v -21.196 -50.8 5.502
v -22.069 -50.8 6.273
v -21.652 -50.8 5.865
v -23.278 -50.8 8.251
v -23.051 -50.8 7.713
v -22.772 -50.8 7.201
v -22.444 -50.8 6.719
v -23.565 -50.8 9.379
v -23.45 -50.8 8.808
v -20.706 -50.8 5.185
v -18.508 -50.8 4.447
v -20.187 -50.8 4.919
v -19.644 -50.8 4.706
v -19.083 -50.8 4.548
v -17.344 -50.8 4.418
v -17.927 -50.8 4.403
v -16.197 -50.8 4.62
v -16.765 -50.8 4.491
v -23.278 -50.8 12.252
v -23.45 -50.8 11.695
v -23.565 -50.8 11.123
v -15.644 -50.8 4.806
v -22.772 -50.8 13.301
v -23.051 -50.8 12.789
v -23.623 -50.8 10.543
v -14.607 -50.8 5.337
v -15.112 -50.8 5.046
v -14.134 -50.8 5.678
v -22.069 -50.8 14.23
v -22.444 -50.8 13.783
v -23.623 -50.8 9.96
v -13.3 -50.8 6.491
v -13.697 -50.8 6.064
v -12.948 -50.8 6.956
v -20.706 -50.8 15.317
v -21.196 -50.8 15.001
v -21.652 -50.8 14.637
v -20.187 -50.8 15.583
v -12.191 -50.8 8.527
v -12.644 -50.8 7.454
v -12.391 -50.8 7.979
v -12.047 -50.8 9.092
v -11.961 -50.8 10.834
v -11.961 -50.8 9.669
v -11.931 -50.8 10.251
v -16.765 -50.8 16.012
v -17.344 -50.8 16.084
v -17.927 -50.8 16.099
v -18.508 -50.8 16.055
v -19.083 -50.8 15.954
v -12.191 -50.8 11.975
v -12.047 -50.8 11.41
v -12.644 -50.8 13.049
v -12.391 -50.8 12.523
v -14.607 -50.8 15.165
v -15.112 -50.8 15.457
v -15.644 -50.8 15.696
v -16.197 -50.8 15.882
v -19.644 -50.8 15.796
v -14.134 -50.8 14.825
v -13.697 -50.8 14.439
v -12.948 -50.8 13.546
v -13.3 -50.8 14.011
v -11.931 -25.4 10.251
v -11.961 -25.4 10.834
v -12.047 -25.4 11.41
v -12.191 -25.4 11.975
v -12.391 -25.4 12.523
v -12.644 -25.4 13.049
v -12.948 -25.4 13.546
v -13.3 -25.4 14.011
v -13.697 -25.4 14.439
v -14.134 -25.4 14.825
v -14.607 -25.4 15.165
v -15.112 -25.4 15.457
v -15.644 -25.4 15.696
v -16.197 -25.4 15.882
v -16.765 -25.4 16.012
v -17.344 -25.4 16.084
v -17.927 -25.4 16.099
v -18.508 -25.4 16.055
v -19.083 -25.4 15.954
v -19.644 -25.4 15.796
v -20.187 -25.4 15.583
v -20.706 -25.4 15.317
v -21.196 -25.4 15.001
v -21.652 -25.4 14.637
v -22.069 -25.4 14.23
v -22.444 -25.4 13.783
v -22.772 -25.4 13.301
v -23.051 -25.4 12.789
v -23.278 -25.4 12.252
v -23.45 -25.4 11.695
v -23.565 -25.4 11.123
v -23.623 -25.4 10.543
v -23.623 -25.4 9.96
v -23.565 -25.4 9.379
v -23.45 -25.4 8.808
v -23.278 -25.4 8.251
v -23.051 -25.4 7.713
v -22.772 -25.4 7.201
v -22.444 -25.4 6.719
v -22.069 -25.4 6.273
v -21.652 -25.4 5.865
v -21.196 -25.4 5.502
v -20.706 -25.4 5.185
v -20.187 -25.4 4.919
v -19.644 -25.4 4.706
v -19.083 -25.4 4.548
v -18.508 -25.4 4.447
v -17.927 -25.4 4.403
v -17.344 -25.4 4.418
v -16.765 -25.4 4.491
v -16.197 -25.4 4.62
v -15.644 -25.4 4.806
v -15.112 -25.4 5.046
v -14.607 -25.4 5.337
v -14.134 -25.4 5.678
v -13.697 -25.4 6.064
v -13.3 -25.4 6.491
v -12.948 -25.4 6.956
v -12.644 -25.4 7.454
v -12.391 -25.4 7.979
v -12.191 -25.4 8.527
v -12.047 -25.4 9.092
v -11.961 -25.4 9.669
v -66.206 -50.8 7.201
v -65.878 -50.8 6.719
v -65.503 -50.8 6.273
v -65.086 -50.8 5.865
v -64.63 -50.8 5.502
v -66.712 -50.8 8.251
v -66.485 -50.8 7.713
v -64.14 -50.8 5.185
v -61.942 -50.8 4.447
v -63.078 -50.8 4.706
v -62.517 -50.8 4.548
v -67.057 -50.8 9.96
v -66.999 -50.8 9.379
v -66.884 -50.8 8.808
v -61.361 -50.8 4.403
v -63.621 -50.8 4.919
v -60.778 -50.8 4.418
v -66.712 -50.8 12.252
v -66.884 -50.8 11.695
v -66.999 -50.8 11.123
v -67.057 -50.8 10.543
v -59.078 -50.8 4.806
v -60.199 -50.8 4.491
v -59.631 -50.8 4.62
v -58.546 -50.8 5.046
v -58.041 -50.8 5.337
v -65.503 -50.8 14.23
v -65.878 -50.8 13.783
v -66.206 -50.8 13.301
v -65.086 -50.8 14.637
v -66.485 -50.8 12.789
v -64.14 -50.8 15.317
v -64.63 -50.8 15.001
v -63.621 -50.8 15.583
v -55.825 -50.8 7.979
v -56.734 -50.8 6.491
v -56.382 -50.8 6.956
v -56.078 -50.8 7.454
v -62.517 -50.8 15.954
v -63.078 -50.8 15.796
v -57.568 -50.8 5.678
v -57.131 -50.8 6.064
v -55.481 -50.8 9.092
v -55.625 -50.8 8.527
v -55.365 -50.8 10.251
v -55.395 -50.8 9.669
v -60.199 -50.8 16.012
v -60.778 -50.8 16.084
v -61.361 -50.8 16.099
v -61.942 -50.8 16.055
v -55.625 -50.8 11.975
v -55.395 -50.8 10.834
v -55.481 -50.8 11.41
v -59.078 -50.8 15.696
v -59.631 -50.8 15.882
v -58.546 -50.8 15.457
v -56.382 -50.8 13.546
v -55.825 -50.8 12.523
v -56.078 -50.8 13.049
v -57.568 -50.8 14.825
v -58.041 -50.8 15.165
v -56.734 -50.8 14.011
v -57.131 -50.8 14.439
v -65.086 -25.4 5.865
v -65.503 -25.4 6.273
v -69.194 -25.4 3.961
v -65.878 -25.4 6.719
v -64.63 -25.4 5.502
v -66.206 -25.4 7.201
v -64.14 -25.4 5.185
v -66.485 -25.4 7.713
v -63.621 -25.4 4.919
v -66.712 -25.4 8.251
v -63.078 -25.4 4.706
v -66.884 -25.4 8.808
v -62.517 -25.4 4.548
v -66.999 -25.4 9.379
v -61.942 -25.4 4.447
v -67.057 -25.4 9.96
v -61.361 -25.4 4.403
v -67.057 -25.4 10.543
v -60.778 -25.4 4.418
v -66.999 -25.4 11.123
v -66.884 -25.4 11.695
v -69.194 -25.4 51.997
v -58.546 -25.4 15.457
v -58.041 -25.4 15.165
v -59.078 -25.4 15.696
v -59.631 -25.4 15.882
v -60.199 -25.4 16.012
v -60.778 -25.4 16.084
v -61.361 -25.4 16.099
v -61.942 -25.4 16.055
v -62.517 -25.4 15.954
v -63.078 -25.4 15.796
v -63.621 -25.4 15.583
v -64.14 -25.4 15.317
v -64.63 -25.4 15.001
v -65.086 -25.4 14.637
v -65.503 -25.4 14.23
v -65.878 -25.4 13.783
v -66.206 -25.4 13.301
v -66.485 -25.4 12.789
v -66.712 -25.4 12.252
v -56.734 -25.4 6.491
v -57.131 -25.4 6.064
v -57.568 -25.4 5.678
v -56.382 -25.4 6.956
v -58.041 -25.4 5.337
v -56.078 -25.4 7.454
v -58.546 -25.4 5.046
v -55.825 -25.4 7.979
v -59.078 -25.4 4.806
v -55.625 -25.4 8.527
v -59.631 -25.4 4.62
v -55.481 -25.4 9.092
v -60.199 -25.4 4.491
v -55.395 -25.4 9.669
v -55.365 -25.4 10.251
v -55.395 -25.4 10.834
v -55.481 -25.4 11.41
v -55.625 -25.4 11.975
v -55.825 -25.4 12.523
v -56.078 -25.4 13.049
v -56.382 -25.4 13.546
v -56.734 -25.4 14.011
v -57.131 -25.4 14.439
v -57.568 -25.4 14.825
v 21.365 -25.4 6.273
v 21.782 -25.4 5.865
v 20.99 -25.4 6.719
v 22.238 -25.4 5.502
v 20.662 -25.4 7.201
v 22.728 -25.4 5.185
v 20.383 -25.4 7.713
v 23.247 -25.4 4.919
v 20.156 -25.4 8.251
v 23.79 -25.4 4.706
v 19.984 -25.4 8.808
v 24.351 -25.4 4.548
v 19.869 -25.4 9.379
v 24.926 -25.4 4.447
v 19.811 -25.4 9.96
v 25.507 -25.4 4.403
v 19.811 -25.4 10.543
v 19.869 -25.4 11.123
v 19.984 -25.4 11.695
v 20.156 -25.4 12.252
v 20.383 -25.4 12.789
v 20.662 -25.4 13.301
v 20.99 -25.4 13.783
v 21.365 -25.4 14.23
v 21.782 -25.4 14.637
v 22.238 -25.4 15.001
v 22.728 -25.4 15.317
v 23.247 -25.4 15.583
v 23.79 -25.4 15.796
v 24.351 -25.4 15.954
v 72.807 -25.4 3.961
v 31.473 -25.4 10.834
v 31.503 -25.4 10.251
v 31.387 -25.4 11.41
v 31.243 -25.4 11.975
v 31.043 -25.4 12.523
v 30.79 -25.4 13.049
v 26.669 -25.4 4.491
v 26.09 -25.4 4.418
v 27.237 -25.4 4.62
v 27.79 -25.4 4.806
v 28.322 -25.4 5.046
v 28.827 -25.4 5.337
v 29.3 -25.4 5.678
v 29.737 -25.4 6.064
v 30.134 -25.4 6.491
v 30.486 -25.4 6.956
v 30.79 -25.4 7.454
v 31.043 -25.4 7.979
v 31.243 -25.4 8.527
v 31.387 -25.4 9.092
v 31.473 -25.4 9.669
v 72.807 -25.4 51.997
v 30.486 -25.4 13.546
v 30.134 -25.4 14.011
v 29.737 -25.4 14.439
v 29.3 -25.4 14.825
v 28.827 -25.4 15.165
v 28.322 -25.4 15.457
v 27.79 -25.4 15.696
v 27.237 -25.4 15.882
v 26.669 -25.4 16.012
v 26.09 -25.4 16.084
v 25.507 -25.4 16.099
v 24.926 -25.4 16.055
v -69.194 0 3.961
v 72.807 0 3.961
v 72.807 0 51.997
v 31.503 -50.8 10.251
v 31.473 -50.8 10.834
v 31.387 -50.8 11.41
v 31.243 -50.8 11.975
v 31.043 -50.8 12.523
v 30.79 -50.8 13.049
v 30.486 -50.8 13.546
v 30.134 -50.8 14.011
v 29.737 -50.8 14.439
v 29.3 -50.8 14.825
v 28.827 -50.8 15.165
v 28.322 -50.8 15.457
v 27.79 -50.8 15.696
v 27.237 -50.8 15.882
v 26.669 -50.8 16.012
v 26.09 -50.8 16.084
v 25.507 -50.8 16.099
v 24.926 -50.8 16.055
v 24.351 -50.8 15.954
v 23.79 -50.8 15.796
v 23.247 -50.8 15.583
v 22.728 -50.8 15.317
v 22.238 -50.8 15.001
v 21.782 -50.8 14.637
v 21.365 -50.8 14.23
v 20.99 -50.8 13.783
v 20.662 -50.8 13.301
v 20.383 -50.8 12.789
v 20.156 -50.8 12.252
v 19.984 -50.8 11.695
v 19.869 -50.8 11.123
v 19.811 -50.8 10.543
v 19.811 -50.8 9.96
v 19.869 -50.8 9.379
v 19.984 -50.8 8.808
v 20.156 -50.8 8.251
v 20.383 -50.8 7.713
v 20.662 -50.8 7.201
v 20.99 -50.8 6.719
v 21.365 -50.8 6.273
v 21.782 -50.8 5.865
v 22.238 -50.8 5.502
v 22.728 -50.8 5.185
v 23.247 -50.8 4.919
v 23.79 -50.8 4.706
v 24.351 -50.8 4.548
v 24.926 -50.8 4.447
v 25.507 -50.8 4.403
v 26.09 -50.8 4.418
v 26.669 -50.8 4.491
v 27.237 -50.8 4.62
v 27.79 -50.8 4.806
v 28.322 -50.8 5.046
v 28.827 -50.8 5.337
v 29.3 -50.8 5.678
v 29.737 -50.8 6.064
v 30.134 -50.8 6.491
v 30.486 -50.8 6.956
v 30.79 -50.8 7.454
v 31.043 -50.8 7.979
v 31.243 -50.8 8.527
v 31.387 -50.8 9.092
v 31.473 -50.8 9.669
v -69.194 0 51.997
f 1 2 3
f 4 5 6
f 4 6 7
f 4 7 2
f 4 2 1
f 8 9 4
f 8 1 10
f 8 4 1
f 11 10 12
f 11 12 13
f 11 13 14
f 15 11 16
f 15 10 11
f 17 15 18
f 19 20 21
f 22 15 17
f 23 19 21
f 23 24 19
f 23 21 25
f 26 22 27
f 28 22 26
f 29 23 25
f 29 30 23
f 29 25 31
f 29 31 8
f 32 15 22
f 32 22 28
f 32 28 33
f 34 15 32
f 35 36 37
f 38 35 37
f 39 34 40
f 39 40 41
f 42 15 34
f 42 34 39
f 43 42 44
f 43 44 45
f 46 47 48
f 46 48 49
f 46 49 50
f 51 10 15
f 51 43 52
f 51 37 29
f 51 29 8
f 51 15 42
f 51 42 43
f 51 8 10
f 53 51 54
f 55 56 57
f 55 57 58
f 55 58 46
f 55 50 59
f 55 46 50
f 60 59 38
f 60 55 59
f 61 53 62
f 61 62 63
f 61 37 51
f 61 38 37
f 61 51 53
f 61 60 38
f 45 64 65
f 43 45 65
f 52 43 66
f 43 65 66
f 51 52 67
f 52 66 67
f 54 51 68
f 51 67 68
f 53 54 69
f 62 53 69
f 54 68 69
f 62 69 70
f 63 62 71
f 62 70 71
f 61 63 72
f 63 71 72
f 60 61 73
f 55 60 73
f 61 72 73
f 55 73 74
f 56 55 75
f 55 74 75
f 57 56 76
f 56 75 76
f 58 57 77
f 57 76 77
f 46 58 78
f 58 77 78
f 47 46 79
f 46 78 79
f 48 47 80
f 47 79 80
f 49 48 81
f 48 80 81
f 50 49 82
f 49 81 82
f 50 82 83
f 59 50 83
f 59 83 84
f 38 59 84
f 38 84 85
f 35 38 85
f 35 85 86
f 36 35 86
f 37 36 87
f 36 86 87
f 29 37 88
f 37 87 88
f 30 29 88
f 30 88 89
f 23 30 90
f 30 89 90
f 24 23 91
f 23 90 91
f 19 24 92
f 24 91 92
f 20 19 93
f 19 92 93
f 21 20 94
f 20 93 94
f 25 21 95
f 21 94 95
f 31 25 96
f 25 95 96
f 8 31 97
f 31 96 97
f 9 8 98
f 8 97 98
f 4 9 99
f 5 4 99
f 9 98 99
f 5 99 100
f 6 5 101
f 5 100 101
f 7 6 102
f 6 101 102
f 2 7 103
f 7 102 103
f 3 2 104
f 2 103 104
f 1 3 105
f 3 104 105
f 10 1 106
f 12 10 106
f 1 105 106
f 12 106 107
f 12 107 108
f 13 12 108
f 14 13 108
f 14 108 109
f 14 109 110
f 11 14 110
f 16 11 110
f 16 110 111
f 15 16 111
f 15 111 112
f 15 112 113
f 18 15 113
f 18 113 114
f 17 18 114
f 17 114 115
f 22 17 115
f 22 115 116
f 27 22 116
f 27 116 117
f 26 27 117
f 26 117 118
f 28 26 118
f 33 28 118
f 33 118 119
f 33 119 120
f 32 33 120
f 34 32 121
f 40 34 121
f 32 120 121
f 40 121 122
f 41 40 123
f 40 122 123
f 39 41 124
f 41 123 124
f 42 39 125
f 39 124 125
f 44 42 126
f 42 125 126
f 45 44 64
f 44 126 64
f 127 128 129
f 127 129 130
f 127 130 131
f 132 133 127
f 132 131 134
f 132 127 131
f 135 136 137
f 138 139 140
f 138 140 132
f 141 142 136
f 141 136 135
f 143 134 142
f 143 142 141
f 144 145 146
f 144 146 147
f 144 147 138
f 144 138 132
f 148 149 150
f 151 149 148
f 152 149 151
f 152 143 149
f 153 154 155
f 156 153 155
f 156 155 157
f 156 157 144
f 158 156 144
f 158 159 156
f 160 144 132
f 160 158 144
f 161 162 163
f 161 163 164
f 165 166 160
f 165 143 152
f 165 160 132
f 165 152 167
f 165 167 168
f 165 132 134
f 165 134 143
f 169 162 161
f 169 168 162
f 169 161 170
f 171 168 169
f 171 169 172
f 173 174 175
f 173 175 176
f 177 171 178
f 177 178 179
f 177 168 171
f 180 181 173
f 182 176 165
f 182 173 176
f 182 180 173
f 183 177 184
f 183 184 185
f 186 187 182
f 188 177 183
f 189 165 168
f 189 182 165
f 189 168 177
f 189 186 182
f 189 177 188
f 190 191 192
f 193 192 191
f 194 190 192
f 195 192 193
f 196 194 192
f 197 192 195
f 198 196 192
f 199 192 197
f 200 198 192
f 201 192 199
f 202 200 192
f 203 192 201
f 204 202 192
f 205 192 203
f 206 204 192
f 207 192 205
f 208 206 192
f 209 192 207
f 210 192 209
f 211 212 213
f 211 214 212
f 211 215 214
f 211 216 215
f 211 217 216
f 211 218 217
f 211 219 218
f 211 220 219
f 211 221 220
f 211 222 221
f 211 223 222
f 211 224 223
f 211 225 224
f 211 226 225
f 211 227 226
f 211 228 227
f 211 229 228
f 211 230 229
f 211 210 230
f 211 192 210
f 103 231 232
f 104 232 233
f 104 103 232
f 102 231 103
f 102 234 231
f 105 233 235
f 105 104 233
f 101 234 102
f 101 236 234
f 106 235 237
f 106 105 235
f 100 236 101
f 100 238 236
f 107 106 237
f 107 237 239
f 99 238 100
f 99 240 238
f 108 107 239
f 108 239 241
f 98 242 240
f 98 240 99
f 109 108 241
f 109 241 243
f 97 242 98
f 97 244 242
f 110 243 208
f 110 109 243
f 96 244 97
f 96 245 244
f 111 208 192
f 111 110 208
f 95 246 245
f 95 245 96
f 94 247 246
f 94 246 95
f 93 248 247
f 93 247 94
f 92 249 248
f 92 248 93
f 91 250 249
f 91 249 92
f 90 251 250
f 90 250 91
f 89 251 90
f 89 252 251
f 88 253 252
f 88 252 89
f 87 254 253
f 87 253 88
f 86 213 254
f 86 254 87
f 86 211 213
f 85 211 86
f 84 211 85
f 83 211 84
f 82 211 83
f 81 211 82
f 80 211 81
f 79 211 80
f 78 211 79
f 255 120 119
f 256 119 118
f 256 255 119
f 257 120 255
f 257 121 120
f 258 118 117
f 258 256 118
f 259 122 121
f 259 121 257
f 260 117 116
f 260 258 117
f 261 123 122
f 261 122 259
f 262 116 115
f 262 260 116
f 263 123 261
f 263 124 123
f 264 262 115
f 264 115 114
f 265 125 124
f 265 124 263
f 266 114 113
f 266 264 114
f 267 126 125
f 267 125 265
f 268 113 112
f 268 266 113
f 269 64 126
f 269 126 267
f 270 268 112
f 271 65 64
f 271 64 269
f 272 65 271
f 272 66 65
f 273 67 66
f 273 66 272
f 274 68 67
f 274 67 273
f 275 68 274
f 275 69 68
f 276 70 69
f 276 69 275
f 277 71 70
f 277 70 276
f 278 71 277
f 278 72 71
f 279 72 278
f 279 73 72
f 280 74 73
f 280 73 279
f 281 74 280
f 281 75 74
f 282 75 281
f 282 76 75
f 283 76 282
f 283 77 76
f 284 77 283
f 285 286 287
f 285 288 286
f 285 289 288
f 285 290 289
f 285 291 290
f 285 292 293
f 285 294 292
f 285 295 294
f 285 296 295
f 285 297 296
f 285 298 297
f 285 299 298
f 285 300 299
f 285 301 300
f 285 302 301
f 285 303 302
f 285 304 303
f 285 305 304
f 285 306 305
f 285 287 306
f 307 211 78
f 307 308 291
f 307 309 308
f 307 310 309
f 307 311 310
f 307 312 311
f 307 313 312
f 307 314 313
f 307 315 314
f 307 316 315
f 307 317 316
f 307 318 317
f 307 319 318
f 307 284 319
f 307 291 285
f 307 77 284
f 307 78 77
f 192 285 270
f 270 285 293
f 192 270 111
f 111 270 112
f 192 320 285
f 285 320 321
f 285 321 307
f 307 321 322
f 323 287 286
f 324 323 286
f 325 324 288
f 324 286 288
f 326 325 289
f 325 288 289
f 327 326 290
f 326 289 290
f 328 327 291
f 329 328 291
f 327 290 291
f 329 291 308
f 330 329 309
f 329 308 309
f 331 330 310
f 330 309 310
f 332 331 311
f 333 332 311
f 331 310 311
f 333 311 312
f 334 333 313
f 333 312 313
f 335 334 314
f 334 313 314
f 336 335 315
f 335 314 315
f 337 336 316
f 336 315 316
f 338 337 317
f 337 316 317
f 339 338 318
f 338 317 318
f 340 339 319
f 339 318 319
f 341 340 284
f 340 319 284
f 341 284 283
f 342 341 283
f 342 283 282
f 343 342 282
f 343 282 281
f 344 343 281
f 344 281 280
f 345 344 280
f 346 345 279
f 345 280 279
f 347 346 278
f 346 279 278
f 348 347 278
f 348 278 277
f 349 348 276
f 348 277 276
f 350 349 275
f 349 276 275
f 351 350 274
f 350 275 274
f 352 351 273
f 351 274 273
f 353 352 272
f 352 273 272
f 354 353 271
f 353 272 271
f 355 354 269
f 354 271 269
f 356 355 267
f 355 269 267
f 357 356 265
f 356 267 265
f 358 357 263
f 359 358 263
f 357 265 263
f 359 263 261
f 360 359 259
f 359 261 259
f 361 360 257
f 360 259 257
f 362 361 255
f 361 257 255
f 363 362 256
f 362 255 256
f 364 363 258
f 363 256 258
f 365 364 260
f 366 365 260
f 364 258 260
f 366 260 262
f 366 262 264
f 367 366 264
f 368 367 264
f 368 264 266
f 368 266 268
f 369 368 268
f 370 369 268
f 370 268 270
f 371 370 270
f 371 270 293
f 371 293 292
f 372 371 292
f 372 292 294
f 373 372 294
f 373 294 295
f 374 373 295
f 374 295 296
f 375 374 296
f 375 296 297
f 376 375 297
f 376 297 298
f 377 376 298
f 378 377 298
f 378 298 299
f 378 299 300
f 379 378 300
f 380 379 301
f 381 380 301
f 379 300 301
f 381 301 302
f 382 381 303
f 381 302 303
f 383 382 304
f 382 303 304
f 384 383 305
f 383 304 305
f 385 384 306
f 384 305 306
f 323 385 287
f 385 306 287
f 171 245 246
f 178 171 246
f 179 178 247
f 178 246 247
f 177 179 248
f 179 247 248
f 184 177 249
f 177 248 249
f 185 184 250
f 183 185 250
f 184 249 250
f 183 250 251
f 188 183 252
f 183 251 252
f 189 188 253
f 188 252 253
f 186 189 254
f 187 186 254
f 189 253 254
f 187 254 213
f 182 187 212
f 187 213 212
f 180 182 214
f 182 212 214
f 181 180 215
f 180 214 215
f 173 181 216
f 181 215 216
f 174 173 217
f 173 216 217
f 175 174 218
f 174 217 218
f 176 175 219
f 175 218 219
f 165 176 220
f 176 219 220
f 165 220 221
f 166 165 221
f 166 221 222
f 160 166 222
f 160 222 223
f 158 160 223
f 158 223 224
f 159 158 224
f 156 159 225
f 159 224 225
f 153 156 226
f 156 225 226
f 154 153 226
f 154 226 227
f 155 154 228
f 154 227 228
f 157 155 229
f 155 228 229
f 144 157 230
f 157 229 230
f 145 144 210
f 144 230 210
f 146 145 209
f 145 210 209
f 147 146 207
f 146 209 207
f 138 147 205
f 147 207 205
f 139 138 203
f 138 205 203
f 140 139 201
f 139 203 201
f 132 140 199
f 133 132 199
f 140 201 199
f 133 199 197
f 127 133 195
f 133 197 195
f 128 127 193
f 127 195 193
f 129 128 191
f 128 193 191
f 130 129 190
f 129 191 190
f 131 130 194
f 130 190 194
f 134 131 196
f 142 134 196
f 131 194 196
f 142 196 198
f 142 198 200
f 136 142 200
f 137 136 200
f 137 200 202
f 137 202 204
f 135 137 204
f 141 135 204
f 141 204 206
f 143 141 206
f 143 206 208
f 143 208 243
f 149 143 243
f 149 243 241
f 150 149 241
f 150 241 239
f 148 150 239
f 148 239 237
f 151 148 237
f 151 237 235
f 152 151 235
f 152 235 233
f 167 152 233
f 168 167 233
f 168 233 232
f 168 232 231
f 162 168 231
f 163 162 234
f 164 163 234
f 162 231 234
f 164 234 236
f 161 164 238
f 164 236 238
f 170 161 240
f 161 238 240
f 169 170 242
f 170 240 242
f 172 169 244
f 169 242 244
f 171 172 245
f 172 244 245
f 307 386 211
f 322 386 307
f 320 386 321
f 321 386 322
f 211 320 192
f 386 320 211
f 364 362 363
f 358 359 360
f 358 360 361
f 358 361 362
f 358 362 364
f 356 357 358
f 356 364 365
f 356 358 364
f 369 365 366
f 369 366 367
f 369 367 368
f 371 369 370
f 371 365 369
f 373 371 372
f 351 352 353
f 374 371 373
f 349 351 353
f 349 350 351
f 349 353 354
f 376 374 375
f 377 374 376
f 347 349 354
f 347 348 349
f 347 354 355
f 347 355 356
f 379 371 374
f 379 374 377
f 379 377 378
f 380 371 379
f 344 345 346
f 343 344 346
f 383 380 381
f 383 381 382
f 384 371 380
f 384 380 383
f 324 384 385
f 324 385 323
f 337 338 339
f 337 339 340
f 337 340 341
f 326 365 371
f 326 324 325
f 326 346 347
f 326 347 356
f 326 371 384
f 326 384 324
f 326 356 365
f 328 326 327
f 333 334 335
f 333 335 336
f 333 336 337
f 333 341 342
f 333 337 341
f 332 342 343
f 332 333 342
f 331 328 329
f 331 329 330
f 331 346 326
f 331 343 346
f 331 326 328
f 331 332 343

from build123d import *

# Parameters (mm, degrees)
F0_W     = 142.000898
F0_H     = 48.036786
F1_DEPTH = 25.4
F2_R     = 5.849573
F3_DEPTH = 25.4


with BuildPart() as f1:
    # F0 (on Front) → F1 (new body)
    with BuildSketch(Plane.XZ):
        with Locations((1.806505, 27.979008)):
            Rectangle(F0_W, F0_H)
    extrude(amount=F1_DEPTH)

    # F2 (on face) → F3 (join)
    with BuildSketch(Plane.XZ.offset(25.4)):
        with Locations((-61.215024, 10.251221)):
            Circle(F2_R)
        with Locations((-17.781024, 10.251221)):
            Circle(F2_R)
        with Locations((25.652976, 10.251221)):
            Circle(F2_R)
    extrude(amount=F3_DEPTH)


solid = f1.part
